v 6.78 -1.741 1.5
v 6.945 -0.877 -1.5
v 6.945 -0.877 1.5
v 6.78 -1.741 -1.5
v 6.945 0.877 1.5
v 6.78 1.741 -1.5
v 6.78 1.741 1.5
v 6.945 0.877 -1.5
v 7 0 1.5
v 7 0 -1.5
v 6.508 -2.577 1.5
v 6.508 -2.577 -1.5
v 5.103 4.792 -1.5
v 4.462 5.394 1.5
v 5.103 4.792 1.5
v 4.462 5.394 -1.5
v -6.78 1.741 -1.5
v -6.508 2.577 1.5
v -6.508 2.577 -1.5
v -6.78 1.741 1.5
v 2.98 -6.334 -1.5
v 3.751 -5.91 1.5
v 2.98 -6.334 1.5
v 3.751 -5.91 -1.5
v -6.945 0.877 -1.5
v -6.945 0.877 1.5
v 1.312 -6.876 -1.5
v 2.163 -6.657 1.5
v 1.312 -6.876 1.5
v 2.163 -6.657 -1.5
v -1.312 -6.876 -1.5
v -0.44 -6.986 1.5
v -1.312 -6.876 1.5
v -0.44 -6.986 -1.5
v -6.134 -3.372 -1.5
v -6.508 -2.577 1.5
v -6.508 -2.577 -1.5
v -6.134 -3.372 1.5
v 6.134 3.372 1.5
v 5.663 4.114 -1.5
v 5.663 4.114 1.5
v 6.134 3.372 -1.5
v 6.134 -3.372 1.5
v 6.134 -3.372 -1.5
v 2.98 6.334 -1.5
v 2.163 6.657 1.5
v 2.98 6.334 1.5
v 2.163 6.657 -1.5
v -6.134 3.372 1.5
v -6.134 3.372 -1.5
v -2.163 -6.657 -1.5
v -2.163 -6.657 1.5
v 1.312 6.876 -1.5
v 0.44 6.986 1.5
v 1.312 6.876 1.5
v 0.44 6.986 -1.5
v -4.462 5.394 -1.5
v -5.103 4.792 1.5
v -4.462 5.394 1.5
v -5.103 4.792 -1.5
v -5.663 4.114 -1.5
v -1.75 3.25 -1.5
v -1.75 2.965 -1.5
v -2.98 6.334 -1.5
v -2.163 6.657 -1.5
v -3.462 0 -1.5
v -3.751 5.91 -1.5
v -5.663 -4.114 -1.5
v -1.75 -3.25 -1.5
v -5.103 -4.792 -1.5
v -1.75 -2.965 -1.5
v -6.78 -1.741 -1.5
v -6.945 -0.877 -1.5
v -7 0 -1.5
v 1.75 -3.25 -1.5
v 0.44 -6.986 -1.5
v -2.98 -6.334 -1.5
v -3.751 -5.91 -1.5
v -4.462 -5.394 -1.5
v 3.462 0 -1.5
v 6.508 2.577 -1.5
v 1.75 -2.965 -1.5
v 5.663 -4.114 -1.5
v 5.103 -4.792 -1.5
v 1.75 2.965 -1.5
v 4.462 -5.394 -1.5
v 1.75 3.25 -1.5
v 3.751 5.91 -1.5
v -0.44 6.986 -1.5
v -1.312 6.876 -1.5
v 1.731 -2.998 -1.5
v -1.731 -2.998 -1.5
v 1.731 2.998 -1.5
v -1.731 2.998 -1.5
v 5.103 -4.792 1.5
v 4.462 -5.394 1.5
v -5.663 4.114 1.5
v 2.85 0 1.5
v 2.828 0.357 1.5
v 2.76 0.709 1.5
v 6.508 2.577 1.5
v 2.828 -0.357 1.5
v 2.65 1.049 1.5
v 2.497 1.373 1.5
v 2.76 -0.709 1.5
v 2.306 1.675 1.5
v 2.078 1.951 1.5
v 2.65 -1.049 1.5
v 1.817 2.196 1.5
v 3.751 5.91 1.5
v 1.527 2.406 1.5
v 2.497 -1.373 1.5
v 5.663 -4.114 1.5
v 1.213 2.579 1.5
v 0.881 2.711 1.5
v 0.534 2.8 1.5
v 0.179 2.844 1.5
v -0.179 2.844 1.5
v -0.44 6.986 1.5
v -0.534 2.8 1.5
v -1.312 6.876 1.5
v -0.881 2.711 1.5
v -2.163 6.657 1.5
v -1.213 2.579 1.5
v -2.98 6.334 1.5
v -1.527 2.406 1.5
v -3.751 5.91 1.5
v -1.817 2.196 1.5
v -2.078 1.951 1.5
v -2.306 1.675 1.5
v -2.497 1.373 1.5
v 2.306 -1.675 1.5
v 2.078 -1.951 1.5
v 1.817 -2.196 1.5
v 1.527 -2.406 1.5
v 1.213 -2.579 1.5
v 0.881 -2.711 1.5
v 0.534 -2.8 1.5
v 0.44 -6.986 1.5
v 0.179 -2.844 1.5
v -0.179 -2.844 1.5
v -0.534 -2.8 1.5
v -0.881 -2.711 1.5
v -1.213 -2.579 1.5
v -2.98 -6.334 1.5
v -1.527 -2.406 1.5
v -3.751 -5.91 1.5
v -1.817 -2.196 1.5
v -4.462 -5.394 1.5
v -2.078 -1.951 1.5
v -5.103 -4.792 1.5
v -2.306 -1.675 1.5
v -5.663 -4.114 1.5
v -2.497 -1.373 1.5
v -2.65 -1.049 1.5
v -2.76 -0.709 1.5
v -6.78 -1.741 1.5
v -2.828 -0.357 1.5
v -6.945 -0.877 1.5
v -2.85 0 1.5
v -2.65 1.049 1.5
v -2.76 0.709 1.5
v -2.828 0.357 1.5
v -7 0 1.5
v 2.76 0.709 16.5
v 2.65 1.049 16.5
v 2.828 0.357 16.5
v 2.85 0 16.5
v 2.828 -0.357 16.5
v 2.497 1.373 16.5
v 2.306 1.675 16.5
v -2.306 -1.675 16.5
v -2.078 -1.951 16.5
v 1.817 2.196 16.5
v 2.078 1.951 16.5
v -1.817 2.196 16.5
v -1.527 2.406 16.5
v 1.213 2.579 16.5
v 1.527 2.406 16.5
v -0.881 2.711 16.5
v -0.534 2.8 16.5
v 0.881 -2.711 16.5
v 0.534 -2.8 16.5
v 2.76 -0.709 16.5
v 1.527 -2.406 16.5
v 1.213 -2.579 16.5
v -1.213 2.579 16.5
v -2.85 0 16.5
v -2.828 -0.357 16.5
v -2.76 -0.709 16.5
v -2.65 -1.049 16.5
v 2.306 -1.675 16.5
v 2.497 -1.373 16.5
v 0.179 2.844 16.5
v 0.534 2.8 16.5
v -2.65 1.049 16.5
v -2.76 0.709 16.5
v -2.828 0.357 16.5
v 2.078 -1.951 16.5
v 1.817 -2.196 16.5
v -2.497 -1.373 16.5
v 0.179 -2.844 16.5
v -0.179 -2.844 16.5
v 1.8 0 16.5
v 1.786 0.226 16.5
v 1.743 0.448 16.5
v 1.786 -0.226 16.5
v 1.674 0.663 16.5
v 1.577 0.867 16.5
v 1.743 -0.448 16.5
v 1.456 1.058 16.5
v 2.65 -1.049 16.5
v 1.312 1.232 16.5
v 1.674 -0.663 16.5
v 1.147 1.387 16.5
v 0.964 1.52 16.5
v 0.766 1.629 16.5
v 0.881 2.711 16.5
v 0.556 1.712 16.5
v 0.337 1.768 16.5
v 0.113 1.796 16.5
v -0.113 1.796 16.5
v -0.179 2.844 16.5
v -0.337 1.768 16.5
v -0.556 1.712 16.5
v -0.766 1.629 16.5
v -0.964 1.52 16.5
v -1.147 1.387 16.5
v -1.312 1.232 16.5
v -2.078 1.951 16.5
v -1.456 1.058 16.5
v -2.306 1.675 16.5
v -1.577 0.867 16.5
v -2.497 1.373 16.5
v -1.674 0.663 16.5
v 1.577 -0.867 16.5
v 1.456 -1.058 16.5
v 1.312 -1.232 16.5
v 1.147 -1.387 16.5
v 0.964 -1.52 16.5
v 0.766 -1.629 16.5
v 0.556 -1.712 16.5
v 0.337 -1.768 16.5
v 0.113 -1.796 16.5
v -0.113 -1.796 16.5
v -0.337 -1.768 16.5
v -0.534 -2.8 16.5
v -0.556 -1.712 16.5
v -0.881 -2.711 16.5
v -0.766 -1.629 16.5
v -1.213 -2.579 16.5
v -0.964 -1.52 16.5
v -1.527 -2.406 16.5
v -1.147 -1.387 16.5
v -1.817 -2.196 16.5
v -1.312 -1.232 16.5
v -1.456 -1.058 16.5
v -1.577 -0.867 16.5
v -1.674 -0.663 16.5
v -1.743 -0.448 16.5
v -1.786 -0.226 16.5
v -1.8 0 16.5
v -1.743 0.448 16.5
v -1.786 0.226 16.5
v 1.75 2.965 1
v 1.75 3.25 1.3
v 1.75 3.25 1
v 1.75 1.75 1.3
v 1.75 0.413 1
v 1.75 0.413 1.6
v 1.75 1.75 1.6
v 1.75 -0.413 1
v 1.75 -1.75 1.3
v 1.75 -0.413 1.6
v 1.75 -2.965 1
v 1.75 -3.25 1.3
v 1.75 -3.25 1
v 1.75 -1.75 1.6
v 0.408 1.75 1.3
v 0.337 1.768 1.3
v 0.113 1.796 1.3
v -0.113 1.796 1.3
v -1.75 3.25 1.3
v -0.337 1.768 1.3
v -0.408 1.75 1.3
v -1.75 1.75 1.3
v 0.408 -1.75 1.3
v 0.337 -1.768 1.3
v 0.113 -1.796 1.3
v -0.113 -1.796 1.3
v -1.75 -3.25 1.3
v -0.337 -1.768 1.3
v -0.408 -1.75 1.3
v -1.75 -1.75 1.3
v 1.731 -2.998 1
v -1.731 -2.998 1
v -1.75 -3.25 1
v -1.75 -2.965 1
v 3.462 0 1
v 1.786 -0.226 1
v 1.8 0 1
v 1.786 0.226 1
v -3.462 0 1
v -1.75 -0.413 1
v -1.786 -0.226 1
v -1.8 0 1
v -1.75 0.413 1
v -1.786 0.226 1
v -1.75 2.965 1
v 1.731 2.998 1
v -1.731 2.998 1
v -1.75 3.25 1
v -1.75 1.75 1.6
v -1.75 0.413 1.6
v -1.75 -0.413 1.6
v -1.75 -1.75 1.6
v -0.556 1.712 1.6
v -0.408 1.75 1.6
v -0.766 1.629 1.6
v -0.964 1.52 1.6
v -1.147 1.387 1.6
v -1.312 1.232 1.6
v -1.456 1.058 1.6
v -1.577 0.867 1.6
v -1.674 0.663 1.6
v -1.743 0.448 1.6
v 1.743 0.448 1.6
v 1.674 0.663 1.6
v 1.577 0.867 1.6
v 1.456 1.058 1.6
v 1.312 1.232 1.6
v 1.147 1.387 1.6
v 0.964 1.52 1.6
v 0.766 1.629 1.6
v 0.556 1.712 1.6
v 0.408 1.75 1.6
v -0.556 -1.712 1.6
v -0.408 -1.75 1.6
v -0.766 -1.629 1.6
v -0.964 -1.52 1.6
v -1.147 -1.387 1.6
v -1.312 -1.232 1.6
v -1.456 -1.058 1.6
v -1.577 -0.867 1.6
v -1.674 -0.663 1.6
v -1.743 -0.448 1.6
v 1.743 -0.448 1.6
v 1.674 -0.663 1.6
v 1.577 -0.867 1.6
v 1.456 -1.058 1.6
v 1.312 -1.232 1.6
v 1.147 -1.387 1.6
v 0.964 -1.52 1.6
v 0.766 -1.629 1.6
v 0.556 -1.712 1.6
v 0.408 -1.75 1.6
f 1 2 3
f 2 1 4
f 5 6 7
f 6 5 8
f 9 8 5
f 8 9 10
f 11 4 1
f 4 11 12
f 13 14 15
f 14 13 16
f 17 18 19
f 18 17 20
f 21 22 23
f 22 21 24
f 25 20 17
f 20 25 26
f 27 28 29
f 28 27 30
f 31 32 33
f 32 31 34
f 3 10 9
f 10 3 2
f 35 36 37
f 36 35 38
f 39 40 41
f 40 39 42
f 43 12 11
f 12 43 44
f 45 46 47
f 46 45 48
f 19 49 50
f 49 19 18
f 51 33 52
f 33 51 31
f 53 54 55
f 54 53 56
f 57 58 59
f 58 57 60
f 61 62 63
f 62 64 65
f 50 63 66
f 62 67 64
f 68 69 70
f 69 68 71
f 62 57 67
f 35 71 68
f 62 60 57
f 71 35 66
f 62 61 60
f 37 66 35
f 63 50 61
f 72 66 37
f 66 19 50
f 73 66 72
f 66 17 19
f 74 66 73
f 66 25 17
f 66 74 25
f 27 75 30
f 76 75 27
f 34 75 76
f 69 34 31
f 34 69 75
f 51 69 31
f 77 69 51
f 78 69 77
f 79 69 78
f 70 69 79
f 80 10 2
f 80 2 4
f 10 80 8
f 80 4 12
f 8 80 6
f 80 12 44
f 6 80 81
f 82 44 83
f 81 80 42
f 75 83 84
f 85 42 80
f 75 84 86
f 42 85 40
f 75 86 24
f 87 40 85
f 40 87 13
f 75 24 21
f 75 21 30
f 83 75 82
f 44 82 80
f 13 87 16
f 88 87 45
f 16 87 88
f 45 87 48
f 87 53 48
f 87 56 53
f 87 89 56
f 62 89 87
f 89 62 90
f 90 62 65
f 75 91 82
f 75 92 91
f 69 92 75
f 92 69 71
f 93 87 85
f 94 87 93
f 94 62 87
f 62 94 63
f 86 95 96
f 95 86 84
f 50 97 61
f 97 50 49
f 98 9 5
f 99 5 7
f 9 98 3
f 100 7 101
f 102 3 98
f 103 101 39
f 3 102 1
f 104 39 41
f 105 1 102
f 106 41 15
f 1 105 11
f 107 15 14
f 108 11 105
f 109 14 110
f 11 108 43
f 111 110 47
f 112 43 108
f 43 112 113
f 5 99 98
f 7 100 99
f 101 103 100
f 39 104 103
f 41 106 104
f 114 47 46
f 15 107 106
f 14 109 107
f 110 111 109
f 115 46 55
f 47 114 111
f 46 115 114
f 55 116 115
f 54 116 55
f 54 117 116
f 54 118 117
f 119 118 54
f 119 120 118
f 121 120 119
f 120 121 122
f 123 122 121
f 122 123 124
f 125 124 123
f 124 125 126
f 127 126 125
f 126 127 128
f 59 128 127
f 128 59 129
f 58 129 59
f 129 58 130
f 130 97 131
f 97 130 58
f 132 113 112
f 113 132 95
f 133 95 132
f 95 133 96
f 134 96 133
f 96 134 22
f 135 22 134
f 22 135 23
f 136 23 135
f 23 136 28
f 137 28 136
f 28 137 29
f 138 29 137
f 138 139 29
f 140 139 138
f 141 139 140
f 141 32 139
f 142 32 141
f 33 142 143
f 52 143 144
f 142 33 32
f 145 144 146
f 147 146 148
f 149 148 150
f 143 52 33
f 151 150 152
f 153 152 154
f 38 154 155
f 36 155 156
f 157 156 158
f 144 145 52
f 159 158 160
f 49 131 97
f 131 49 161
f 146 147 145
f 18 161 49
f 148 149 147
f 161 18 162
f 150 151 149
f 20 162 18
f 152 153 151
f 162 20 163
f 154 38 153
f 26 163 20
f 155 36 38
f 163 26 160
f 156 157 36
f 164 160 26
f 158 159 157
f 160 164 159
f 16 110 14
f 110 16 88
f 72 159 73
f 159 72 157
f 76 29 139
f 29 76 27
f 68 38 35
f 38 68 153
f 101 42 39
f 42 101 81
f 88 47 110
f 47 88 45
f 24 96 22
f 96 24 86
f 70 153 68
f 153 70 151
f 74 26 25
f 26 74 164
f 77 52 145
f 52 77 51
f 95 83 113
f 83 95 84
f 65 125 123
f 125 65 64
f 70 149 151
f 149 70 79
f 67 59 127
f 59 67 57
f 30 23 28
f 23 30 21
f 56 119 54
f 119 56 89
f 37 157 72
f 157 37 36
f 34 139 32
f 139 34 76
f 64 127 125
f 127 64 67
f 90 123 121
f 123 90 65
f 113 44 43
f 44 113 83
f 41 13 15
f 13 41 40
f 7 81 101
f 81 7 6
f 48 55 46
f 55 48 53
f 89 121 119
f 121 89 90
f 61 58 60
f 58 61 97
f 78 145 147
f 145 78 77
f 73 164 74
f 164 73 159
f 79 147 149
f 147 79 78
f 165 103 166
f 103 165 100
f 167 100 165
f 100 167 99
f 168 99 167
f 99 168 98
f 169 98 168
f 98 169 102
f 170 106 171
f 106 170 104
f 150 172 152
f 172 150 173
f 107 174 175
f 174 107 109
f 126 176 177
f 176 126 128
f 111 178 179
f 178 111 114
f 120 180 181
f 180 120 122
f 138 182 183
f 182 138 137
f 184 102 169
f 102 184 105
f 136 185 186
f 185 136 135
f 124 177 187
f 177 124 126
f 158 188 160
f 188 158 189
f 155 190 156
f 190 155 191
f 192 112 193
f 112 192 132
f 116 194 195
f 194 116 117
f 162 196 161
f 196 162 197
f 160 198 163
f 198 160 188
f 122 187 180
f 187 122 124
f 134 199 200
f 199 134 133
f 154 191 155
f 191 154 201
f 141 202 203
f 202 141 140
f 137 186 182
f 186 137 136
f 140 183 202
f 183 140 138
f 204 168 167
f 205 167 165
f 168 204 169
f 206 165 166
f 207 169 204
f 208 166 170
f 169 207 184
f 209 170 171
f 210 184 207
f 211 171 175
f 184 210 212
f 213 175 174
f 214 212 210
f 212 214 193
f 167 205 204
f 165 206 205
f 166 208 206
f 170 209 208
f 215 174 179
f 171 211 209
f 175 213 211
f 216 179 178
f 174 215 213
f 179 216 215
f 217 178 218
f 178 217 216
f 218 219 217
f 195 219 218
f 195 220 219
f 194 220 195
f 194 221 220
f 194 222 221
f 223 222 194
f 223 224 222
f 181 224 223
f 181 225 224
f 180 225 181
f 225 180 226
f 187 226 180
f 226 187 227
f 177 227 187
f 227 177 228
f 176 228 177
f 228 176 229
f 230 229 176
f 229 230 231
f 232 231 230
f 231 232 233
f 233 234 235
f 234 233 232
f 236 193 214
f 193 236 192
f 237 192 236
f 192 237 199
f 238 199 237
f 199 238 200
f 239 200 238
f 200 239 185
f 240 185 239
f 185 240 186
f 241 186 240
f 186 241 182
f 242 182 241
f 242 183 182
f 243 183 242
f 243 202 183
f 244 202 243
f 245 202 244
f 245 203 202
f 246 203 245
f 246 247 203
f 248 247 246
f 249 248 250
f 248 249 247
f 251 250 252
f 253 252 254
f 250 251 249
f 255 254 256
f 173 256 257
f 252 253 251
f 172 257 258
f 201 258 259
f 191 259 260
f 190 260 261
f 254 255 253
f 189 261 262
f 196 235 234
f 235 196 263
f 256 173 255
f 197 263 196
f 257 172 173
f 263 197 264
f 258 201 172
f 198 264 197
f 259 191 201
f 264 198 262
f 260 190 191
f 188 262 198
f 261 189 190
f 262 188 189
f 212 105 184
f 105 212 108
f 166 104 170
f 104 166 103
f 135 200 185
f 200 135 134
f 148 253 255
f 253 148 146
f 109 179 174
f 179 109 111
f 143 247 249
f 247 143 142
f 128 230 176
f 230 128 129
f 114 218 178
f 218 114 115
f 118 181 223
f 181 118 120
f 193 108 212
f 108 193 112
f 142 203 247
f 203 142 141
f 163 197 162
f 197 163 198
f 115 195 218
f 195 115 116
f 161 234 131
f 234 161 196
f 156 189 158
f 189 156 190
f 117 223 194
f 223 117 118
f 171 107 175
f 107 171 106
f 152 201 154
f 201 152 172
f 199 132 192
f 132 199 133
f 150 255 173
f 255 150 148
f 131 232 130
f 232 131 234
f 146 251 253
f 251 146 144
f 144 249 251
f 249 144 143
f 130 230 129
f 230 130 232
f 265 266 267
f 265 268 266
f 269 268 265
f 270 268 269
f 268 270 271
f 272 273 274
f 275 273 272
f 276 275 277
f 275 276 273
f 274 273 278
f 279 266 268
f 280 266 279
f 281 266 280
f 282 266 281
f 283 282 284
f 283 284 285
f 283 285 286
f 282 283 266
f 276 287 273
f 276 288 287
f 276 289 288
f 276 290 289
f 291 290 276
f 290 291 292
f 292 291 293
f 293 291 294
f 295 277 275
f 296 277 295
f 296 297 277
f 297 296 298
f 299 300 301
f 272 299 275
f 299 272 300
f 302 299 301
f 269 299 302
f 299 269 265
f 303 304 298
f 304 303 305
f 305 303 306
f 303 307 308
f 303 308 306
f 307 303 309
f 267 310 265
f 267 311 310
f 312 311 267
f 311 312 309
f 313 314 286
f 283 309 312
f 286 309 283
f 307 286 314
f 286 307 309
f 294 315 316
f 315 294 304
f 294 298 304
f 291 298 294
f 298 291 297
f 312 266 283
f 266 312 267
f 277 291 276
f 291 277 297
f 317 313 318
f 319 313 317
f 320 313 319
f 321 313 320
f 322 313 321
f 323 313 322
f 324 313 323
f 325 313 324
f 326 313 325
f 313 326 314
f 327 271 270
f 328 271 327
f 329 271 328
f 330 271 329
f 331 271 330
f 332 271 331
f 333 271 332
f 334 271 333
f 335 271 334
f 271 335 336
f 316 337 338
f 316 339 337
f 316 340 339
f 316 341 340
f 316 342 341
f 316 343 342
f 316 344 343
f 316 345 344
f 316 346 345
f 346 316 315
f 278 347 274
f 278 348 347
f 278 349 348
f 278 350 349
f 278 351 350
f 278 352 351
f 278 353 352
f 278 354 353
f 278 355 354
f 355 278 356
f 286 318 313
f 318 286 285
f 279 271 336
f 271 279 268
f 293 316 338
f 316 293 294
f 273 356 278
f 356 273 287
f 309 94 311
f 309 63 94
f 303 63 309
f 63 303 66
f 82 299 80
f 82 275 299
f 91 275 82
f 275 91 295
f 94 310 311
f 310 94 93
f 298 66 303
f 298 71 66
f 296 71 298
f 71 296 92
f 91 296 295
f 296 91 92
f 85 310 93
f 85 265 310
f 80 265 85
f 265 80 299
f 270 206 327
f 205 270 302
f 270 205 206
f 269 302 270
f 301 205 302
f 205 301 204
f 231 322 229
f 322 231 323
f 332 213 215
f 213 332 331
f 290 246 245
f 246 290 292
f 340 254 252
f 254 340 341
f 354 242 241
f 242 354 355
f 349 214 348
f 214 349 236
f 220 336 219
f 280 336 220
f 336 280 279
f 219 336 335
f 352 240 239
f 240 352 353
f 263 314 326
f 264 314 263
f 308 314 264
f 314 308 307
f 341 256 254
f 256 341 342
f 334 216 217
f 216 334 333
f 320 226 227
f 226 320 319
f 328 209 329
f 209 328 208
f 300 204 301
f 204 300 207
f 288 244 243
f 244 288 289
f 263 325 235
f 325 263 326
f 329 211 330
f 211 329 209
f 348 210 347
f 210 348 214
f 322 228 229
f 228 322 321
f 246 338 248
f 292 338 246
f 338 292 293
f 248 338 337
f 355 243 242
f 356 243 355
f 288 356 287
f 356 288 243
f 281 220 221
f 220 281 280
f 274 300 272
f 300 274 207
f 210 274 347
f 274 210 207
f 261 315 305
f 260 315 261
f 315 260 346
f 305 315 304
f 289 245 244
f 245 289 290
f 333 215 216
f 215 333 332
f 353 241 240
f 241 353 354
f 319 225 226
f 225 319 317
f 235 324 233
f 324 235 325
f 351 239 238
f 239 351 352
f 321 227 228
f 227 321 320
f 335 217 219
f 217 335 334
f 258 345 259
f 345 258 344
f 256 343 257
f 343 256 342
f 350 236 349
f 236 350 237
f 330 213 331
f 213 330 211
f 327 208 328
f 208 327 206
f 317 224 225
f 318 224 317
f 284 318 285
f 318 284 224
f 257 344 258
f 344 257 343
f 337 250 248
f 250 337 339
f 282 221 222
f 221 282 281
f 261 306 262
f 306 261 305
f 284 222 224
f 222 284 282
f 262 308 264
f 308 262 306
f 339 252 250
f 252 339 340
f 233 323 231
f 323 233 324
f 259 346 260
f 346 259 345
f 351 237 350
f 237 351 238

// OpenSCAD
$fn = 50;


difference() {
	union() {
		translate(v = [0, 0, -1.5000000000]) {
			cylinder(h = 3, r = 7.0000000000);
		}
		translate(v = [0, 0, -1.5000000000]) {
			cylinder(h = 18, r = 2.8500000000);
		}
	}
	union() {
		translate(v = [0, 0, -1.5000000000]) {
			rotate(a = [0, 0, 0]) {
				difference() {
					union() {
						translate(v = [-1.7500000000, -3.2500000000, -0.3000000000]) {
							cube(size = [3.5000000000, 6.5000000000, 0.3000000000]);
						}
						translate(v = [-1.7500000000, -1.7500000000, -0.6000000000]) {
							cube(size = [3.5000000000, 3.5000000000, 0.3000000000]);
						}
						translate(v = [-1.7500000000, -3.2500000000, 2.5000000000]) {
							cube(size = [3.5000000000, 6.5000000000, 0.3000000000]);
						}
						translate(v = [-1.7500000000, -1.7500000000, 2.8000000000]) {
							cube(size = [3.5000000000, 3.5000000000, 0.3000000000]);
						}
						linear_extrude(height = 2.5000000000) {
							polygon(points = [[3.4620000000, 0.0000000000], [1.7310000000, 2.9981799479], [-1.7310000000, 2.9981799479], [-3.4620000000, 0.0000000000], [-1.7310000000, -2.9981799479], [1.7310000000, -2.9981799479]]);
						}
						translate(v = [-1.7500000000, -3.2500000000, -0.3000000000]) {
							cube(size = [3.5000000000, 6.5000000000, 0.3000000000]);
						}
						translate(v = [-1.7500000000, -1.7500000000, -0.6000000000]) {
							cube(size = [3.5000000000, 3.5000000000, 0.3000000000]);
						}
						translate(v = [-1.7500000000, -3.2500000000, 2.5000000000]) {
							cube(size = [3.5000000000, 6.5000000000, 0.3000000000]);
						}
						translate(v = [-1.7500000000, -1.7500000000, 2.8000000000]) {
							cube(size = [3.5000000000, 3.5000000000, 0.3000000000]);
						}
						translate(v = [-1.7500000000, -3.2500000000, -0.3000000000]) {
							cube(size = [3.5000000000, 6.5000000000, 0.3000000000]);
						}
						translate(v = [-1.7500000000, -1.7500000000, -0.6000000000]) {
							cube(size = [3.5000000000, 3.5000000000, 0.3000000000]);
						}
						translate(v = [-1.7500000000, -3.2500000000, 2.5000000000]) {
							cube(size = [3.5000000000, 6.5000000000, 0.3000000000]);
						}
						translate(v = [-1.7500000000, -1.7500000000, 2.8000000000]) {
							cube(size = [3.5000000000, 3.5000000000, 0.3000000000]);
						}
					}
					union();
				}
			}
		}
		translate(v = [0, 0, -100.0000000000]) {
			cylinder(h = 200, r = 1.8000000000);
		}
	}
}
